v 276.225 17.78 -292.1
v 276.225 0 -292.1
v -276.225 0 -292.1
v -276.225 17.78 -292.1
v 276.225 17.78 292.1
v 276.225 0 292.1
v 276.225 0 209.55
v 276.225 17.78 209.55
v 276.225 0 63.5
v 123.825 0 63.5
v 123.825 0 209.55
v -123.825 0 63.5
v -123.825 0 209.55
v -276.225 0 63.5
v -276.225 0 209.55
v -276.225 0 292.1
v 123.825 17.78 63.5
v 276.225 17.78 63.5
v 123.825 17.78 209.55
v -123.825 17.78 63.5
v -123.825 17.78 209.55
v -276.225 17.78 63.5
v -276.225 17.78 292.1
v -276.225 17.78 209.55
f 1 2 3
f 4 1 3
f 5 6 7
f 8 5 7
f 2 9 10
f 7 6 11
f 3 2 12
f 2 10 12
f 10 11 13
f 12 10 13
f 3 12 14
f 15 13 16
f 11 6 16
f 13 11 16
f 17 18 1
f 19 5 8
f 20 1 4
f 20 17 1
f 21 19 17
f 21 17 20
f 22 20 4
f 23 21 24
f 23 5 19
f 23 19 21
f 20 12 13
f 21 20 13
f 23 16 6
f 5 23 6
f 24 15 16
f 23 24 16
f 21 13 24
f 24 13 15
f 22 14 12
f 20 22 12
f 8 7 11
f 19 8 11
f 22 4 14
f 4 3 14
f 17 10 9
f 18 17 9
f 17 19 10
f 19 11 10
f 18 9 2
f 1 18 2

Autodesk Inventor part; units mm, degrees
ref_plane "YZ Plane" through (0, 0, 0) normal (1, 0, 0) x (0, 1, 0)
ref_plane "XZ Plane" through (0, 0, 0) normal (0, 1, 0) x (-1, 0, 0)
ref_plane "XY Plane" through (0, 0, 0) normal (0, 0, 1) x (1, 0, 0)
sketch "Sketch1" plane through (0, 0, 0) normal (0, 1, 0) x (-1, 0, 0)
  line L0 (-276.225, 292.1) -> (-276.225, -292.1)
  line L1 (-276.225, -292.1) -> (276.225, -292.1)
  line L2 (276.225, -292.1) -> (276.225, 292.1)
  line L3 (276.225, 292.1) -> (-276.225, 292.1)
  line L4 (-276.225, 292.1) -> (276.225, -292.1) construction
  line L5 (-276.225, -292.1) -> (276.225, 292.1) construction
  point P0 (0, 0)
  dimension "baseLength" = 584.2
  dimension "baseWidth" = 552.45
extrude "Extrusion1" add sketch "Sketch1" along normal blind 17.78
sketch "Sketch2" plane through (0, 0, 0) normal (0, -1, 0) x (1, 0, 0)
  line L0 (276.225, 292.1) -> (276.225, -292.1) projected
  line L1 (276.225, 209.55) -> (123.825, 209.55)
  line L2 (123.825, 209.55) -> (123.825, 63.5)
  line L3 (123.825, 63.5) -> (276.225, 63.5)
  line L4 (276.225, 63.5) -> (276.225, 209.55)
  line L5 (-276.225, 292.1) -> (276.225, 292.1) projected
  point P0 (0, 0)
  dimension "backToEndOfGearBox" = 82.55
  dimension "backToFrontOfGearBox" = 228.6
  dimension "wdithForGearBox" = 152.4
extrude "Extrusion2" cut sketch "Sketch2" against normal through all
mirror "Mirror1" about plane through (0, 0, 0) normal (1, 0, 0) of "Extrusion2"
equation "\"spaceingAlongSides\" = 3.175"
equation "\"distanceFromBackForEndBolt\" = 38.1"
equation "\"spacingForBolt\" = 25.4"
equation "\"widthOfSpacingForBolt\" = 12.7"
equation "\"lengthOfSpacingForBolt\" = 25.4"
properties part number "RhinoBottomFloorPlate03" material "Wood (Birch)"
